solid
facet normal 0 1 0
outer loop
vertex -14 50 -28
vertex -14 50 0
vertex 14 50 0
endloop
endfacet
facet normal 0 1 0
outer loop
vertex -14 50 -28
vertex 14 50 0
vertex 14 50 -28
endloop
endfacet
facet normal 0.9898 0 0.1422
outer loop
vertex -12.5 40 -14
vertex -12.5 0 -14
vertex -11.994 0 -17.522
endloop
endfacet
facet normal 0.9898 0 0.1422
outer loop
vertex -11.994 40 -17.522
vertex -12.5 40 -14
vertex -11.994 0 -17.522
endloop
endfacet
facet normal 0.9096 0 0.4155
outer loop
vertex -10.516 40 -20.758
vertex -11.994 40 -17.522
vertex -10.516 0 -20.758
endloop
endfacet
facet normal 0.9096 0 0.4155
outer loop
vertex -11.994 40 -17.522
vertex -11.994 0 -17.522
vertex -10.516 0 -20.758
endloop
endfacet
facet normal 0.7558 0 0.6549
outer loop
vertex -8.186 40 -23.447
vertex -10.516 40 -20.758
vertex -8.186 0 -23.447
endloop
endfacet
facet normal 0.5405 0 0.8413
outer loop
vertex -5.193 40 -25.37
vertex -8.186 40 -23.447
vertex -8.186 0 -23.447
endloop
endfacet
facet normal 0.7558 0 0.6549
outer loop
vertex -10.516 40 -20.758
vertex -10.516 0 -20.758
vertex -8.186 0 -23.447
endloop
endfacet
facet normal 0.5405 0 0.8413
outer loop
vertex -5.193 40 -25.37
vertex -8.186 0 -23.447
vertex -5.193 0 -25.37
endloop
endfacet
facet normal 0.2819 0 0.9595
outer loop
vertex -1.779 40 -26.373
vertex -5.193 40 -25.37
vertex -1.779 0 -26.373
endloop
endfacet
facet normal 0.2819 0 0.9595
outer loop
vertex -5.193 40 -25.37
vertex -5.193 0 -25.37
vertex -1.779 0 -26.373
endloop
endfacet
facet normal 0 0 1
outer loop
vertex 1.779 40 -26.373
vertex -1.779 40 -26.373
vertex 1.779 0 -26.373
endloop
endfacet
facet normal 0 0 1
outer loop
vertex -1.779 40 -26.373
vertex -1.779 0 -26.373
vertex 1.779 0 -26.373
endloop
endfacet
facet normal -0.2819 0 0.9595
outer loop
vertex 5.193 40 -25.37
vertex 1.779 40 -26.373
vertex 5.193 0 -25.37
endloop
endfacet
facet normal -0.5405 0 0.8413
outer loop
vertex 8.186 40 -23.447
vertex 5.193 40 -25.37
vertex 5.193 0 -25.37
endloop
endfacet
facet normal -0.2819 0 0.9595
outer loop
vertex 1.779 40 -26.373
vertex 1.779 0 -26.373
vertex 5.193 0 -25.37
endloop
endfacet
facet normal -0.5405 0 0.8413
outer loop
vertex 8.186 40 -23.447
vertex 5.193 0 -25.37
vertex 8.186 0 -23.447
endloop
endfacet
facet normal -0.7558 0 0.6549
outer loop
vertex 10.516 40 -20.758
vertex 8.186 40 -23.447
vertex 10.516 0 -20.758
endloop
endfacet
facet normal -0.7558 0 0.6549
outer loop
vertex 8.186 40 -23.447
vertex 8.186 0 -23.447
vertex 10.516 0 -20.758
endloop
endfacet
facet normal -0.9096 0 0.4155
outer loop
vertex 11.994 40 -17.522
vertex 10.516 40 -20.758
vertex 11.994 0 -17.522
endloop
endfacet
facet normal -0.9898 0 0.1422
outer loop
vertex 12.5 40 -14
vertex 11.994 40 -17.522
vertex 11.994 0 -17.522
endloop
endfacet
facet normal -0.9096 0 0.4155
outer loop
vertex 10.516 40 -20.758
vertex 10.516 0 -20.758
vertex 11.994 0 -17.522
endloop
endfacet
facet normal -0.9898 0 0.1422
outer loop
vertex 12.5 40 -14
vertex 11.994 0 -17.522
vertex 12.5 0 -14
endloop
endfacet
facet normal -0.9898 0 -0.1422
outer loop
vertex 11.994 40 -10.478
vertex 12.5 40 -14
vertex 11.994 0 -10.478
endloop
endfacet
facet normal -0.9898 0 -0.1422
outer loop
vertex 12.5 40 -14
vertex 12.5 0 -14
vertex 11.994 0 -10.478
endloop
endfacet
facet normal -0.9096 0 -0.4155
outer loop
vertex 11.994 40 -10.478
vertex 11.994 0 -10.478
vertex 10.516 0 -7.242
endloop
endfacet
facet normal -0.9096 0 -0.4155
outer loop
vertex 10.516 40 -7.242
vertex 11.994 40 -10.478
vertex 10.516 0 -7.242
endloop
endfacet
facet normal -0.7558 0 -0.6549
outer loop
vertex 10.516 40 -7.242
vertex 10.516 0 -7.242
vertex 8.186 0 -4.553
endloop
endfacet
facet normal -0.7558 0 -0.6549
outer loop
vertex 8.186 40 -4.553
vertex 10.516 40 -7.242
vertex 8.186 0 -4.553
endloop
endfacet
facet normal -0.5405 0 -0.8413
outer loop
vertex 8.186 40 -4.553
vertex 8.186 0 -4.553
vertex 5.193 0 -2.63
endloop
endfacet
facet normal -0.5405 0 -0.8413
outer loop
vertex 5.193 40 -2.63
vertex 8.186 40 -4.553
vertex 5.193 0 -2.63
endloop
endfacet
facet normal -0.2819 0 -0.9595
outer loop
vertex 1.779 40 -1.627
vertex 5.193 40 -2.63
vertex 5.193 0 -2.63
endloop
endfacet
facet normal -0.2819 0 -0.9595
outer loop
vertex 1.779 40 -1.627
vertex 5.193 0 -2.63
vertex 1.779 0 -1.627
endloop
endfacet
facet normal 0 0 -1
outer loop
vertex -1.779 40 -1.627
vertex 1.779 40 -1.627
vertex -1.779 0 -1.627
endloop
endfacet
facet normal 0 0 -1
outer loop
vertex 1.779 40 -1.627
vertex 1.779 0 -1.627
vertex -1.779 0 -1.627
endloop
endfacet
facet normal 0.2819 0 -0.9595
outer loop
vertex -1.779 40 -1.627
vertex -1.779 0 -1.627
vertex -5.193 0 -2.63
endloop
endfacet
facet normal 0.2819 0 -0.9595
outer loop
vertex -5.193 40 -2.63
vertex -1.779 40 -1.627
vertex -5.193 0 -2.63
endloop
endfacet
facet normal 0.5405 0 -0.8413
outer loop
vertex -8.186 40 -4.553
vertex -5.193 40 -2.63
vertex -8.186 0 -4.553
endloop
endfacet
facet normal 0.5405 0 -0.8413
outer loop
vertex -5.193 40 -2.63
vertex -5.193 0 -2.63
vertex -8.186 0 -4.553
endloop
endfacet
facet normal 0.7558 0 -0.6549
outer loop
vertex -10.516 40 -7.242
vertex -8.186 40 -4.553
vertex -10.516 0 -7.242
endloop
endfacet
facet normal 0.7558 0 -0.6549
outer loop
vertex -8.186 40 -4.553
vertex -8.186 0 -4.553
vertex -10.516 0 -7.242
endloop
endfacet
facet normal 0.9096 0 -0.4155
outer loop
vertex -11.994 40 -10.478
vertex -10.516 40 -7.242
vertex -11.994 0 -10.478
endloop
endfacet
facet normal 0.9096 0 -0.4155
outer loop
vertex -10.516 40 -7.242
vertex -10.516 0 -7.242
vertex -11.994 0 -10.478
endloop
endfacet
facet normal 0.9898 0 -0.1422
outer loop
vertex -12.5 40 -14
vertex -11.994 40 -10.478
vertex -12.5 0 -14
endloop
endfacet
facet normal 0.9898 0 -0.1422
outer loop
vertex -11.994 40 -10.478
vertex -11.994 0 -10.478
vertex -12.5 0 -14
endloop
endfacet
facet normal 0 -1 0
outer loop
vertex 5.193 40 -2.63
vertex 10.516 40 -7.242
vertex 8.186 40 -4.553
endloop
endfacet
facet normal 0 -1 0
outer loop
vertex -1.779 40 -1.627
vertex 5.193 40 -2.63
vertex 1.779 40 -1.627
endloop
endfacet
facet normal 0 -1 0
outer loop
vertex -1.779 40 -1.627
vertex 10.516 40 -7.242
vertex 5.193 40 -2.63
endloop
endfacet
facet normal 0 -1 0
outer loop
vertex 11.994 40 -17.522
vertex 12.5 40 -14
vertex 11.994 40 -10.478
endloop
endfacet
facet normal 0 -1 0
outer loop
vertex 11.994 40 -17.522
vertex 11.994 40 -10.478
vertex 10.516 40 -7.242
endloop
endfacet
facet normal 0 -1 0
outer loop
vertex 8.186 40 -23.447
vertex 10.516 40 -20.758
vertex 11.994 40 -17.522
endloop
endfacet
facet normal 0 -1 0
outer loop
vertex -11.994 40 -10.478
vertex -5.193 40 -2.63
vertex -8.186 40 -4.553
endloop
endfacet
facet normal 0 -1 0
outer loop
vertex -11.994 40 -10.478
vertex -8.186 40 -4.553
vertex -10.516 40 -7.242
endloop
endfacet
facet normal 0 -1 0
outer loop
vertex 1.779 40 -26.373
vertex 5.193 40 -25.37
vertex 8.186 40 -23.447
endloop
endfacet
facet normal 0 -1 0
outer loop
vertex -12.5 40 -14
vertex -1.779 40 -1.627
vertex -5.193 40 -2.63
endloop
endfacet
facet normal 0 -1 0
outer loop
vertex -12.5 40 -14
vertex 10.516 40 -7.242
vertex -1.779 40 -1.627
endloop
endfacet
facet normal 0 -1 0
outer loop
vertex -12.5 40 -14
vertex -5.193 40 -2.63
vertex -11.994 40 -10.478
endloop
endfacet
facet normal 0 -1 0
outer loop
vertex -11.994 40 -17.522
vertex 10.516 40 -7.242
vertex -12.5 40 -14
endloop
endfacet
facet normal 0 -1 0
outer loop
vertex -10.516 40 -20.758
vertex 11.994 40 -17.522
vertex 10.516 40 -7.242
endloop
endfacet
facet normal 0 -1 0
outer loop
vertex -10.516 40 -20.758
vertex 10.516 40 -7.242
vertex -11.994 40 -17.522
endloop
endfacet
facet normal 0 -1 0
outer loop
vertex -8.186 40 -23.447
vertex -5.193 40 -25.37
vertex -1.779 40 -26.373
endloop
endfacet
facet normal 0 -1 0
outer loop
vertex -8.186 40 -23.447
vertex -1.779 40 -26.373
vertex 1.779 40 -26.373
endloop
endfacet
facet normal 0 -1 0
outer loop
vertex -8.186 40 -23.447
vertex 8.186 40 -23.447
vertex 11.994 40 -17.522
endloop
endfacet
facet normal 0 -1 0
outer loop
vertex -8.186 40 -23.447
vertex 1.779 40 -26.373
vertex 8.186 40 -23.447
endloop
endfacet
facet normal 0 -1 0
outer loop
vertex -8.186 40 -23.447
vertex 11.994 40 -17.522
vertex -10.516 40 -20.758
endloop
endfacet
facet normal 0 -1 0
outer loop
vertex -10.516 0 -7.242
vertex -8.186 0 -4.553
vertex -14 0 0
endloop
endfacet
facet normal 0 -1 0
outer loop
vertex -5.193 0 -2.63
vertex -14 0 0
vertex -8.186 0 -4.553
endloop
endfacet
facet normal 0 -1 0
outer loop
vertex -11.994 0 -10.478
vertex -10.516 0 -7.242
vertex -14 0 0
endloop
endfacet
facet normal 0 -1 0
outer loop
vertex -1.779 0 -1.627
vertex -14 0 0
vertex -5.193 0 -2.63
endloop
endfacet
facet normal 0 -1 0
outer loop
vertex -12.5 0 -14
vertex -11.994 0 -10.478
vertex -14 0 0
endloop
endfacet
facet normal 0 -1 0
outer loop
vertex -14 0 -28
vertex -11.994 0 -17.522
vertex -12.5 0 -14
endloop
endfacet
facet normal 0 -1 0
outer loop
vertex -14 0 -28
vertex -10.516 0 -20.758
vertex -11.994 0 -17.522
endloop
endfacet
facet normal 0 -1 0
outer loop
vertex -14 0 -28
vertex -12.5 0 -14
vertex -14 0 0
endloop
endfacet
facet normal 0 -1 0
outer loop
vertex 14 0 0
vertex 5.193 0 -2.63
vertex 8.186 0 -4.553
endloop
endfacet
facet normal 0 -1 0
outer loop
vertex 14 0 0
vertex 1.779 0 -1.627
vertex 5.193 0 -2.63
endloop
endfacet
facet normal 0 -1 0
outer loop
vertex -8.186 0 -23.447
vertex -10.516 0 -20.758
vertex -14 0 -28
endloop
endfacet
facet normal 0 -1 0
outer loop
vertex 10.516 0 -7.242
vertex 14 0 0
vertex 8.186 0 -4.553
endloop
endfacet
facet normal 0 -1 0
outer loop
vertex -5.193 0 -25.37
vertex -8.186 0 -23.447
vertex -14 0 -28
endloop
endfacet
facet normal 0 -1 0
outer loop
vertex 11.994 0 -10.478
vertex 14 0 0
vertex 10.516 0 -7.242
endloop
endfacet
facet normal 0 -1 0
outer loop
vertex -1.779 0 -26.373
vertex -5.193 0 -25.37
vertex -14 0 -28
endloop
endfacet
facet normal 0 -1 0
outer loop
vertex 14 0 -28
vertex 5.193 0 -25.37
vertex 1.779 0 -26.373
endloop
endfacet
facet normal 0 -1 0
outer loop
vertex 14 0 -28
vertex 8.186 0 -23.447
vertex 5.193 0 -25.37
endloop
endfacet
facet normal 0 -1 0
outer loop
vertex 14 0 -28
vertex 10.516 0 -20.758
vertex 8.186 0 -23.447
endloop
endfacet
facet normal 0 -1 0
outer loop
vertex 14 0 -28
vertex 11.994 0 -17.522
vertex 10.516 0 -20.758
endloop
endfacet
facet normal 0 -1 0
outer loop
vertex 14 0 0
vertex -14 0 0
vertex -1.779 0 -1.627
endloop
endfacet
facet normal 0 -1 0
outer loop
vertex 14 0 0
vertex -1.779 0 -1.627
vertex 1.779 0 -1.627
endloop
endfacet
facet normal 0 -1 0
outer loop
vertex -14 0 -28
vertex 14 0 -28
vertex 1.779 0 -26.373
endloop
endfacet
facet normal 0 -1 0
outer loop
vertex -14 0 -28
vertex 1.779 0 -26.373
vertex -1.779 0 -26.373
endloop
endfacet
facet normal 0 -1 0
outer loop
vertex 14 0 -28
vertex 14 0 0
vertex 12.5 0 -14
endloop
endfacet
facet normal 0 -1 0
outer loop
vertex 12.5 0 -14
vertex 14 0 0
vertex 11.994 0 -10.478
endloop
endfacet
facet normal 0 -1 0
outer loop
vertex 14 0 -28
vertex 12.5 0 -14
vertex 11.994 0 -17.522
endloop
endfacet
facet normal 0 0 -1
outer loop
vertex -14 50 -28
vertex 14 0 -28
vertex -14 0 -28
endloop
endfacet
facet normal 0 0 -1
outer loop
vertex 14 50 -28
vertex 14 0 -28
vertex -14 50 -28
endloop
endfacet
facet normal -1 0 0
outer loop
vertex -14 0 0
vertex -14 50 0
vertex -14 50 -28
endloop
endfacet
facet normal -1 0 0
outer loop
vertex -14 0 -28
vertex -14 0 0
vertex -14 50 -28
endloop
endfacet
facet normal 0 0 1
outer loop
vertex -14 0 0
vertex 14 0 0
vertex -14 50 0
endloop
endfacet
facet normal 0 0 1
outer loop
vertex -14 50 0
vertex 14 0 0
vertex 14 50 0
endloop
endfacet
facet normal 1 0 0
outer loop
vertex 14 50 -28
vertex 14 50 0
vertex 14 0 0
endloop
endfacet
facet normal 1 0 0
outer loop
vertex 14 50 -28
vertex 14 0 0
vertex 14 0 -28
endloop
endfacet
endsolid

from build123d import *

# Parameters (mm, degrees)
SKETCH3_W           = 28
SKETCH3_H           = 50
BOSS_EXTRUDE1_DEPTH = 14
SKETCH6_R           = 12.5
CUT_EXTRUDE1_DEPTH  = 40


with BuildPart() as part:
    # Sketch3 → Boss-Extrude1 (new body, symmetric)
    with BuildSketch(Plane(origin=(0, 0, 0), x_dir=(0, 0, -1), z_dir=(1, 0, 0))):
        with Locations((14, 25)):
            Rectangle(SKETCH3_W, SKETCH3_H)
    extrude(amount=BOSS_EXTRUDE1_DEPTH, both=True)

    # Sketch6 → Cut-Extrude1 (cut)
    with BuildSketch(Plane(origin=(0, 0, 0), x_dir=(-1, 0, 0), z_dir=(0, -1, 0))):
        with Locations((0, 14)):
            Circle(SKETCH6_R)
    extrude(amount=-CUT_EXTRUDE1_DEPTH, mode=Mode.SUBTRACT)


solid = part.part
